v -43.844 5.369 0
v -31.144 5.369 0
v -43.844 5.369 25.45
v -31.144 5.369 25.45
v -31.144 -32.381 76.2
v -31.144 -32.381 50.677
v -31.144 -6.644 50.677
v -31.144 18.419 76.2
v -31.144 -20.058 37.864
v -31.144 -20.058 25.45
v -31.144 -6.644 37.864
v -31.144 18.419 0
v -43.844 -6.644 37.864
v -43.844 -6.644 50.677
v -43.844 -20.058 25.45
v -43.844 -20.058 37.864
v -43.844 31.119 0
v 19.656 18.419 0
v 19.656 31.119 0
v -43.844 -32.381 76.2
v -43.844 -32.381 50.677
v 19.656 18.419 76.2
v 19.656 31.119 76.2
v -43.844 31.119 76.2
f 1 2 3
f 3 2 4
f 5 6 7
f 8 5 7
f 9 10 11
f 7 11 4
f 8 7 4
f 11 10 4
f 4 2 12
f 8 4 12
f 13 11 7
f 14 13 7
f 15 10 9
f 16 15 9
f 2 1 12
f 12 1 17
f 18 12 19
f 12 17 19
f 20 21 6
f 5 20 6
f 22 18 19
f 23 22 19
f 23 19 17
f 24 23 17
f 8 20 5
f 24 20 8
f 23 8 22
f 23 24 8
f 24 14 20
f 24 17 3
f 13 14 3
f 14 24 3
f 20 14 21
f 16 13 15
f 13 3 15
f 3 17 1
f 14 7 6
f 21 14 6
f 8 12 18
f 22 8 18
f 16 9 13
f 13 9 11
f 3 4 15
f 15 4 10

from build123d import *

# Parameters (mm, degrees)
F1_DEPTH = 76.2
F3_DEPTH = 25.4


with BuildPart() as f1:
    # F0 (on Top) → F1 (new body)
    with BuildSketch(Plane.XY):
        Polygon((-43.844193, 31.119447), (-43.844193, -32.380553), (-31.144193, -32.380553), (-31.144193, 18.419447), (19.655807, 18.419447), (19.655807, 31.119447), align=None)
    extrude(amount=F1_DEPTH)

    # F2 (on face) → F3 (cut)
    with BuildSketch(Plane.YZ.offset(-31.144193)):
        Polygon((-32.380553, 50.677463), (-32.380553, 0), (5.369338, 0), (5.369338, 25.450481), (-20.057857, 25.450481), (-20.057857, 37.863757), (-6.64351, 37.863757), (-6.64351, 50.677463), align=None)
    extrude(amount=-F3_DEPTH, mode=Mode.SUBTRACT)


solid = f1.part
